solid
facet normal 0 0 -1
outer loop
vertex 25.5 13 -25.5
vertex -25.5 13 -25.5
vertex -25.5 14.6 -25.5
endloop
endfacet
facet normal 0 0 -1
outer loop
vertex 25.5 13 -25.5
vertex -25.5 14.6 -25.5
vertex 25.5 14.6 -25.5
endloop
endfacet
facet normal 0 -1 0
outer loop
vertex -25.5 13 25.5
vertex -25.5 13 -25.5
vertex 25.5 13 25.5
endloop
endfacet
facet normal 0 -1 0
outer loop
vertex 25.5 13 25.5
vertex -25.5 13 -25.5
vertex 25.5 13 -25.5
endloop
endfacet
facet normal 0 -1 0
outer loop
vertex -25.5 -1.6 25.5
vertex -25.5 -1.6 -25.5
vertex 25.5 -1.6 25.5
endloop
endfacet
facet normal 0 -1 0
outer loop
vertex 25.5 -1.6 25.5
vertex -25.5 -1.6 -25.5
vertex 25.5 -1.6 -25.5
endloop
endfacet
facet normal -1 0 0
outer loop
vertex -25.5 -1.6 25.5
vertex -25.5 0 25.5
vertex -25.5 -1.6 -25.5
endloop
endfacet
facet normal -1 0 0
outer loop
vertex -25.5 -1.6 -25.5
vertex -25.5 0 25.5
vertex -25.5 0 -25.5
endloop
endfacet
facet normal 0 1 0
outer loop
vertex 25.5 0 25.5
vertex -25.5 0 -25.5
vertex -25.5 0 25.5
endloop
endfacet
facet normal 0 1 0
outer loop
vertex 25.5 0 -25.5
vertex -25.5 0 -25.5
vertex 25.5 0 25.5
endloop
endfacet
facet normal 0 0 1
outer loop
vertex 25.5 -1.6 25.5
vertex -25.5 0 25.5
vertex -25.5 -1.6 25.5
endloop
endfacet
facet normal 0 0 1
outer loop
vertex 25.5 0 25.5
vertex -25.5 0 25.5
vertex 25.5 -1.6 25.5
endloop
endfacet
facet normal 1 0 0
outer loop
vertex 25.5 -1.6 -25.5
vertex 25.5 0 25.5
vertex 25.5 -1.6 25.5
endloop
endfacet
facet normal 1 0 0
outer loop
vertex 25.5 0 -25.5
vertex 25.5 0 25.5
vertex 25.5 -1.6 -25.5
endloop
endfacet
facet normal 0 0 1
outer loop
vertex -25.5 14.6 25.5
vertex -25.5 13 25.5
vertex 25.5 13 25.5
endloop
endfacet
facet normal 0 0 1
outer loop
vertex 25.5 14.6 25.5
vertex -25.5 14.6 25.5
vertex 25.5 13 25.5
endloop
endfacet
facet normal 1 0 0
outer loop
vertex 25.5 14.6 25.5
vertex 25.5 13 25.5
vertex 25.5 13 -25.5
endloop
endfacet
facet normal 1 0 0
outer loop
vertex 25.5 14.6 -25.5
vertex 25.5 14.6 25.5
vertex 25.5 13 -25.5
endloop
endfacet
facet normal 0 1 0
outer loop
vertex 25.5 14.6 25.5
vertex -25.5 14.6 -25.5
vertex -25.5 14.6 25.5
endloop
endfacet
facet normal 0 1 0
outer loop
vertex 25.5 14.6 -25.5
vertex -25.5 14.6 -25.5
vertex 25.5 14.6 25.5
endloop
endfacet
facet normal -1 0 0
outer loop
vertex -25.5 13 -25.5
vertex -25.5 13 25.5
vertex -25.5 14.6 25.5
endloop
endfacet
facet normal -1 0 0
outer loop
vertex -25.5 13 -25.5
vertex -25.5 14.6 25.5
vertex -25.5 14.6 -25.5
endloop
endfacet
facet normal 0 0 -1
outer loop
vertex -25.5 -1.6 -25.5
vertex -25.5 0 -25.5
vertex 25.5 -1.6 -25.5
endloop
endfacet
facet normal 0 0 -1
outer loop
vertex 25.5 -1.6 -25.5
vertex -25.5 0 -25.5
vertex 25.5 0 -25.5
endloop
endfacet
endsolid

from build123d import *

# Parameters (mm, degrees)
SKETCH2_W           = 51
SKETCH2_H           = 51
BOSS_EXTRUDE1_DEPTH = 1.6
BOSS_EXTRUDE2_START = 13
SKETCH4_W           = 51
SKETCH4_H           = 51
BOSS_EXTRUDE2_DEPTH = 1.6


with BuildPart() as part:
    # Sketch2 → Boss-Extrude1 (new body)
    with BuildSketch(Plane(origin=(0, 0, 0), x_dir=(1, 0, 0), z_dir=(0, 1, 0))):
        Rectangle(SKETCH2_W, SKETCH2_H)
    extrude(amount=-BOSS_EXTRUDE1_DEPTH)


with BuildPart() as body_2:
    # Sketch4 → Boss-Extrude2 (new body)
    with BuildSketch(Plane(origin=(0, 0, 0), x_dir=(1, 0, 0), z_dir=(0, 1, 0)).offset(BOSS_EXTRUDE2_START)):
        Rectangle(SKETCH4_W, SKETCH4_H)
    extrude(amount=BOSS_EXTRUDE2_DEPTH)


solid = Compound([part.part, body_2.part])
